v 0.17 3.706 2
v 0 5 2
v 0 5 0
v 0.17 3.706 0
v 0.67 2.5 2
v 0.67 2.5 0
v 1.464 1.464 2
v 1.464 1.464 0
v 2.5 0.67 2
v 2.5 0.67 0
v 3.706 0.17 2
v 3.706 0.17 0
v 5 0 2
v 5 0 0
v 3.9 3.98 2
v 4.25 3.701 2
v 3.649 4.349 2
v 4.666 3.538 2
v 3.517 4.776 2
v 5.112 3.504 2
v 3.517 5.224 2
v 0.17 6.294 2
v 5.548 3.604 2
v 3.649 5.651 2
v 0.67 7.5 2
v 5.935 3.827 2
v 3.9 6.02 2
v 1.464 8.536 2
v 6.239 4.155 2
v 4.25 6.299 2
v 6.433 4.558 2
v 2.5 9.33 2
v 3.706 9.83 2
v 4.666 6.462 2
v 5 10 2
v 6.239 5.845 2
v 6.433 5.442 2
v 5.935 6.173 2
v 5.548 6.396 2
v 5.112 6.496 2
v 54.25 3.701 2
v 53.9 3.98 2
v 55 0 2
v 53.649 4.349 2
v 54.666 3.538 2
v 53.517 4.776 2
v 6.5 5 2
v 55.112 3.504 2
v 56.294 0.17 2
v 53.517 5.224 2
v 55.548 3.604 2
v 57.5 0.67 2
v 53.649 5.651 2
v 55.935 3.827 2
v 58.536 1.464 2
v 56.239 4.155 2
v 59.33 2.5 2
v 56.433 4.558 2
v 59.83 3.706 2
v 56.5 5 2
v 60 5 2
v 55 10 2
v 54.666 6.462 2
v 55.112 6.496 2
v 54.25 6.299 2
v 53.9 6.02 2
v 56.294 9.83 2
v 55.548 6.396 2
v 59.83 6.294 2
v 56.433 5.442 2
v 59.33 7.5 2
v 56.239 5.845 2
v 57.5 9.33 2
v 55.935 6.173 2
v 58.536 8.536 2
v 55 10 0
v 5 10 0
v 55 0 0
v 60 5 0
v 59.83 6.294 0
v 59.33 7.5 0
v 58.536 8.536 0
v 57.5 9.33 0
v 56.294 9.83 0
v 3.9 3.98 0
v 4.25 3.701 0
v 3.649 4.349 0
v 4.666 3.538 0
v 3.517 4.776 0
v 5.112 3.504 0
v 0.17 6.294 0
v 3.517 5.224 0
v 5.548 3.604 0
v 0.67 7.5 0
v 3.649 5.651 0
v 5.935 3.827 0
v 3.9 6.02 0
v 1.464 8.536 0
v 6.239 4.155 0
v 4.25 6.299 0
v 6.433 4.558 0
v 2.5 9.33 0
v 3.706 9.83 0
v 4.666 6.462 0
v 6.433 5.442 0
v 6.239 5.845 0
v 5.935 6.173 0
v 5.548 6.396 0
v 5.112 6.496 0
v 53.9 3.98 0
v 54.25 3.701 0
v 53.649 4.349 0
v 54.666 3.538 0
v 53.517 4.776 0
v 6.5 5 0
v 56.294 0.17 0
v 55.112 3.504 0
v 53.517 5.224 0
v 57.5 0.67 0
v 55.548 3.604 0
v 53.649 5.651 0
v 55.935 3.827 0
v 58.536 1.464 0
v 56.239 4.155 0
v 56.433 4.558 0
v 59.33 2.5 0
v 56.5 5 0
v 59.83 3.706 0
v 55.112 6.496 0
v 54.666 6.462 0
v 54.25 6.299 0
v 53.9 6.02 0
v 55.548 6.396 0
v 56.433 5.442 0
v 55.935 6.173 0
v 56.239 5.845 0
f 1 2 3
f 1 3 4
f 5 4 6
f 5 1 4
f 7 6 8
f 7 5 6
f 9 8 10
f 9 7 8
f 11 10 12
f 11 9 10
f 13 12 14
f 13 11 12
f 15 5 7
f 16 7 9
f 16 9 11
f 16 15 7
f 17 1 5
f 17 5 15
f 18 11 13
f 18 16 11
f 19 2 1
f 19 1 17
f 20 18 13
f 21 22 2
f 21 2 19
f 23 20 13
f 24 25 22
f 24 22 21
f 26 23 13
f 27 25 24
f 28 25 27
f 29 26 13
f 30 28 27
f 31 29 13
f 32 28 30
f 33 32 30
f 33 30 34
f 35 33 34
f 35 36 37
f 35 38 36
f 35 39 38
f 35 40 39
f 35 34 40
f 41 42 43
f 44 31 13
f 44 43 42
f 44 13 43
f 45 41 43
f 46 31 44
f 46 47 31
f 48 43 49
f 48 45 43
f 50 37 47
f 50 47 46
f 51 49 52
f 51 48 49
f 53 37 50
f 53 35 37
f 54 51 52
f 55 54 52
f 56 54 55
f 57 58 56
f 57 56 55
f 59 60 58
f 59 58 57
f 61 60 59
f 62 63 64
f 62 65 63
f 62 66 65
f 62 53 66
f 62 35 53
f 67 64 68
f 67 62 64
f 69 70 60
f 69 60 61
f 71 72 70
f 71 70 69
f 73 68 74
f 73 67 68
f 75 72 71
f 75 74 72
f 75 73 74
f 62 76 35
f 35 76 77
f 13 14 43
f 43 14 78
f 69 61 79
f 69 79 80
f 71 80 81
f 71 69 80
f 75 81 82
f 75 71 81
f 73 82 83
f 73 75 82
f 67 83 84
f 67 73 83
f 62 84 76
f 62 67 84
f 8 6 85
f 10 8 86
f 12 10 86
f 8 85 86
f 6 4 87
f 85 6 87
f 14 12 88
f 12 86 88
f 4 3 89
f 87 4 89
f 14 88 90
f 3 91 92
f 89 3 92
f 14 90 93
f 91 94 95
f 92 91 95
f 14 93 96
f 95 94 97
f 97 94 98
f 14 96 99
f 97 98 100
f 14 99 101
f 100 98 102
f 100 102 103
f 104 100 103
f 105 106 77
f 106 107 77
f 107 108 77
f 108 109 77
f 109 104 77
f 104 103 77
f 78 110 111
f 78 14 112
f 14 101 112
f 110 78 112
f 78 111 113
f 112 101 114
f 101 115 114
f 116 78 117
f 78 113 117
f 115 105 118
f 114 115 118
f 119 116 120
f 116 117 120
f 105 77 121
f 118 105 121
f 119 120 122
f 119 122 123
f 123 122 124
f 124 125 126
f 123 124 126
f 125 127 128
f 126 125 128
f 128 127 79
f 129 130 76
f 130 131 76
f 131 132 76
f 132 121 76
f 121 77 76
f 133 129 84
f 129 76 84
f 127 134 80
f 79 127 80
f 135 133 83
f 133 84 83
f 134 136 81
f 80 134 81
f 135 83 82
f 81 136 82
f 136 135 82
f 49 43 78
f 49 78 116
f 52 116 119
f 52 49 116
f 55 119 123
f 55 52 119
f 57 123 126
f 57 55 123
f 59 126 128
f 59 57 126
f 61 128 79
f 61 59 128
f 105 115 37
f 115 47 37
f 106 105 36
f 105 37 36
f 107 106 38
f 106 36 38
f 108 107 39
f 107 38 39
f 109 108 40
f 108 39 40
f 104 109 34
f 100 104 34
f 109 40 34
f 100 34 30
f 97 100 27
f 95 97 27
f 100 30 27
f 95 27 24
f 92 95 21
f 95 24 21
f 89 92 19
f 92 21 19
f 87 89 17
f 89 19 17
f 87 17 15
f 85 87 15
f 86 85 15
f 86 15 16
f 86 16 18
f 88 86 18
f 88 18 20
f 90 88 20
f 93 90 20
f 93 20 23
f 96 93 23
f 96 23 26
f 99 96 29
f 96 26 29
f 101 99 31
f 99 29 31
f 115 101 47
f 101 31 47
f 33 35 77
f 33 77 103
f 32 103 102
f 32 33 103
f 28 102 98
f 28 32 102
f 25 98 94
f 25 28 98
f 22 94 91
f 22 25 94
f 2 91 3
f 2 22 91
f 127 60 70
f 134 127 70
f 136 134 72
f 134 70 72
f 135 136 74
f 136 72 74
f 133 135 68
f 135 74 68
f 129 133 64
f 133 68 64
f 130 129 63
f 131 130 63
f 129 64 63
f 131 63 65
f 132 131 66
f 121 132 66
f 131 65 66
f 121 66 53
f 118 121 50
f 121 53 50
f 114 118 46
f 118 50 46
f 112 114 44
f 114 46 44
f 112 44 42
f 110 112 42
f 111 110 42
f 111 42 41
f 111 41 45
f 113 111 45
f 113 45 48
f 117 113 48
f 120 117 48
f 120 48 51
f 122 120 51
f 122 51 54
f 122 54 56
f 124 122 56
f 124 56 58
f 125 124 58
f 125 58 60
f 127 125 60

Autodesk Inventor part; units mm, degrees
ref_plane "YZ Plane" through (0, 0, 0) normal (1, 0, 0) x (0, 1, 0)
ref_plane "XZ Plane" through (0, 0, 0) normal (0, 1, 0) x (-1, 0, 0)
ref_plane "XY Plane" through (0, 0, 0) normal (0, 0, 1) x (1, 0, 0)
sketch "Sketch1" plane through (0, 0, 0) normal (0, 0, 1) x (1, 0, 0)
  line L0 (0, 0) -> (60, 0)
  line L1 (60, 0) -> (60, 10)
  line L2 (60, 10) -> (0, 10)
  line L3 (0, 10) -> (0, 0)
  dimension "d0" = 60
  dimension "d1" = 10
extrude "Extrusion1" add sketch "Sketch1" along normal blind 2
fillet "Fillet1" radius 5 4 edges at (60, 10, 1) (60, 0, 1) (0, 0, 1) (0, 10, 1)
sketch "Sketch2" plane through (0, 0, 2) normal (0, 0, 1) x (1, 0, 0)
  arc A0 (5, 10) -> (5, 0) centre (5, 5) ccw projected
  circle A1 centre (5, 5) radius 1.5
  arc A2 (55, 0) -> (55, 10) centre (55, 5) ccw projected
  circle A3 centre (55, 5) radius 1.5
  point P0 (0, 0)
  dimension "d5" = 3
  dimension "d6" = 3
extrude "Extrusion2" cut sketch "Sketch2" against normal blind 2
properties part number "Side support 1"
